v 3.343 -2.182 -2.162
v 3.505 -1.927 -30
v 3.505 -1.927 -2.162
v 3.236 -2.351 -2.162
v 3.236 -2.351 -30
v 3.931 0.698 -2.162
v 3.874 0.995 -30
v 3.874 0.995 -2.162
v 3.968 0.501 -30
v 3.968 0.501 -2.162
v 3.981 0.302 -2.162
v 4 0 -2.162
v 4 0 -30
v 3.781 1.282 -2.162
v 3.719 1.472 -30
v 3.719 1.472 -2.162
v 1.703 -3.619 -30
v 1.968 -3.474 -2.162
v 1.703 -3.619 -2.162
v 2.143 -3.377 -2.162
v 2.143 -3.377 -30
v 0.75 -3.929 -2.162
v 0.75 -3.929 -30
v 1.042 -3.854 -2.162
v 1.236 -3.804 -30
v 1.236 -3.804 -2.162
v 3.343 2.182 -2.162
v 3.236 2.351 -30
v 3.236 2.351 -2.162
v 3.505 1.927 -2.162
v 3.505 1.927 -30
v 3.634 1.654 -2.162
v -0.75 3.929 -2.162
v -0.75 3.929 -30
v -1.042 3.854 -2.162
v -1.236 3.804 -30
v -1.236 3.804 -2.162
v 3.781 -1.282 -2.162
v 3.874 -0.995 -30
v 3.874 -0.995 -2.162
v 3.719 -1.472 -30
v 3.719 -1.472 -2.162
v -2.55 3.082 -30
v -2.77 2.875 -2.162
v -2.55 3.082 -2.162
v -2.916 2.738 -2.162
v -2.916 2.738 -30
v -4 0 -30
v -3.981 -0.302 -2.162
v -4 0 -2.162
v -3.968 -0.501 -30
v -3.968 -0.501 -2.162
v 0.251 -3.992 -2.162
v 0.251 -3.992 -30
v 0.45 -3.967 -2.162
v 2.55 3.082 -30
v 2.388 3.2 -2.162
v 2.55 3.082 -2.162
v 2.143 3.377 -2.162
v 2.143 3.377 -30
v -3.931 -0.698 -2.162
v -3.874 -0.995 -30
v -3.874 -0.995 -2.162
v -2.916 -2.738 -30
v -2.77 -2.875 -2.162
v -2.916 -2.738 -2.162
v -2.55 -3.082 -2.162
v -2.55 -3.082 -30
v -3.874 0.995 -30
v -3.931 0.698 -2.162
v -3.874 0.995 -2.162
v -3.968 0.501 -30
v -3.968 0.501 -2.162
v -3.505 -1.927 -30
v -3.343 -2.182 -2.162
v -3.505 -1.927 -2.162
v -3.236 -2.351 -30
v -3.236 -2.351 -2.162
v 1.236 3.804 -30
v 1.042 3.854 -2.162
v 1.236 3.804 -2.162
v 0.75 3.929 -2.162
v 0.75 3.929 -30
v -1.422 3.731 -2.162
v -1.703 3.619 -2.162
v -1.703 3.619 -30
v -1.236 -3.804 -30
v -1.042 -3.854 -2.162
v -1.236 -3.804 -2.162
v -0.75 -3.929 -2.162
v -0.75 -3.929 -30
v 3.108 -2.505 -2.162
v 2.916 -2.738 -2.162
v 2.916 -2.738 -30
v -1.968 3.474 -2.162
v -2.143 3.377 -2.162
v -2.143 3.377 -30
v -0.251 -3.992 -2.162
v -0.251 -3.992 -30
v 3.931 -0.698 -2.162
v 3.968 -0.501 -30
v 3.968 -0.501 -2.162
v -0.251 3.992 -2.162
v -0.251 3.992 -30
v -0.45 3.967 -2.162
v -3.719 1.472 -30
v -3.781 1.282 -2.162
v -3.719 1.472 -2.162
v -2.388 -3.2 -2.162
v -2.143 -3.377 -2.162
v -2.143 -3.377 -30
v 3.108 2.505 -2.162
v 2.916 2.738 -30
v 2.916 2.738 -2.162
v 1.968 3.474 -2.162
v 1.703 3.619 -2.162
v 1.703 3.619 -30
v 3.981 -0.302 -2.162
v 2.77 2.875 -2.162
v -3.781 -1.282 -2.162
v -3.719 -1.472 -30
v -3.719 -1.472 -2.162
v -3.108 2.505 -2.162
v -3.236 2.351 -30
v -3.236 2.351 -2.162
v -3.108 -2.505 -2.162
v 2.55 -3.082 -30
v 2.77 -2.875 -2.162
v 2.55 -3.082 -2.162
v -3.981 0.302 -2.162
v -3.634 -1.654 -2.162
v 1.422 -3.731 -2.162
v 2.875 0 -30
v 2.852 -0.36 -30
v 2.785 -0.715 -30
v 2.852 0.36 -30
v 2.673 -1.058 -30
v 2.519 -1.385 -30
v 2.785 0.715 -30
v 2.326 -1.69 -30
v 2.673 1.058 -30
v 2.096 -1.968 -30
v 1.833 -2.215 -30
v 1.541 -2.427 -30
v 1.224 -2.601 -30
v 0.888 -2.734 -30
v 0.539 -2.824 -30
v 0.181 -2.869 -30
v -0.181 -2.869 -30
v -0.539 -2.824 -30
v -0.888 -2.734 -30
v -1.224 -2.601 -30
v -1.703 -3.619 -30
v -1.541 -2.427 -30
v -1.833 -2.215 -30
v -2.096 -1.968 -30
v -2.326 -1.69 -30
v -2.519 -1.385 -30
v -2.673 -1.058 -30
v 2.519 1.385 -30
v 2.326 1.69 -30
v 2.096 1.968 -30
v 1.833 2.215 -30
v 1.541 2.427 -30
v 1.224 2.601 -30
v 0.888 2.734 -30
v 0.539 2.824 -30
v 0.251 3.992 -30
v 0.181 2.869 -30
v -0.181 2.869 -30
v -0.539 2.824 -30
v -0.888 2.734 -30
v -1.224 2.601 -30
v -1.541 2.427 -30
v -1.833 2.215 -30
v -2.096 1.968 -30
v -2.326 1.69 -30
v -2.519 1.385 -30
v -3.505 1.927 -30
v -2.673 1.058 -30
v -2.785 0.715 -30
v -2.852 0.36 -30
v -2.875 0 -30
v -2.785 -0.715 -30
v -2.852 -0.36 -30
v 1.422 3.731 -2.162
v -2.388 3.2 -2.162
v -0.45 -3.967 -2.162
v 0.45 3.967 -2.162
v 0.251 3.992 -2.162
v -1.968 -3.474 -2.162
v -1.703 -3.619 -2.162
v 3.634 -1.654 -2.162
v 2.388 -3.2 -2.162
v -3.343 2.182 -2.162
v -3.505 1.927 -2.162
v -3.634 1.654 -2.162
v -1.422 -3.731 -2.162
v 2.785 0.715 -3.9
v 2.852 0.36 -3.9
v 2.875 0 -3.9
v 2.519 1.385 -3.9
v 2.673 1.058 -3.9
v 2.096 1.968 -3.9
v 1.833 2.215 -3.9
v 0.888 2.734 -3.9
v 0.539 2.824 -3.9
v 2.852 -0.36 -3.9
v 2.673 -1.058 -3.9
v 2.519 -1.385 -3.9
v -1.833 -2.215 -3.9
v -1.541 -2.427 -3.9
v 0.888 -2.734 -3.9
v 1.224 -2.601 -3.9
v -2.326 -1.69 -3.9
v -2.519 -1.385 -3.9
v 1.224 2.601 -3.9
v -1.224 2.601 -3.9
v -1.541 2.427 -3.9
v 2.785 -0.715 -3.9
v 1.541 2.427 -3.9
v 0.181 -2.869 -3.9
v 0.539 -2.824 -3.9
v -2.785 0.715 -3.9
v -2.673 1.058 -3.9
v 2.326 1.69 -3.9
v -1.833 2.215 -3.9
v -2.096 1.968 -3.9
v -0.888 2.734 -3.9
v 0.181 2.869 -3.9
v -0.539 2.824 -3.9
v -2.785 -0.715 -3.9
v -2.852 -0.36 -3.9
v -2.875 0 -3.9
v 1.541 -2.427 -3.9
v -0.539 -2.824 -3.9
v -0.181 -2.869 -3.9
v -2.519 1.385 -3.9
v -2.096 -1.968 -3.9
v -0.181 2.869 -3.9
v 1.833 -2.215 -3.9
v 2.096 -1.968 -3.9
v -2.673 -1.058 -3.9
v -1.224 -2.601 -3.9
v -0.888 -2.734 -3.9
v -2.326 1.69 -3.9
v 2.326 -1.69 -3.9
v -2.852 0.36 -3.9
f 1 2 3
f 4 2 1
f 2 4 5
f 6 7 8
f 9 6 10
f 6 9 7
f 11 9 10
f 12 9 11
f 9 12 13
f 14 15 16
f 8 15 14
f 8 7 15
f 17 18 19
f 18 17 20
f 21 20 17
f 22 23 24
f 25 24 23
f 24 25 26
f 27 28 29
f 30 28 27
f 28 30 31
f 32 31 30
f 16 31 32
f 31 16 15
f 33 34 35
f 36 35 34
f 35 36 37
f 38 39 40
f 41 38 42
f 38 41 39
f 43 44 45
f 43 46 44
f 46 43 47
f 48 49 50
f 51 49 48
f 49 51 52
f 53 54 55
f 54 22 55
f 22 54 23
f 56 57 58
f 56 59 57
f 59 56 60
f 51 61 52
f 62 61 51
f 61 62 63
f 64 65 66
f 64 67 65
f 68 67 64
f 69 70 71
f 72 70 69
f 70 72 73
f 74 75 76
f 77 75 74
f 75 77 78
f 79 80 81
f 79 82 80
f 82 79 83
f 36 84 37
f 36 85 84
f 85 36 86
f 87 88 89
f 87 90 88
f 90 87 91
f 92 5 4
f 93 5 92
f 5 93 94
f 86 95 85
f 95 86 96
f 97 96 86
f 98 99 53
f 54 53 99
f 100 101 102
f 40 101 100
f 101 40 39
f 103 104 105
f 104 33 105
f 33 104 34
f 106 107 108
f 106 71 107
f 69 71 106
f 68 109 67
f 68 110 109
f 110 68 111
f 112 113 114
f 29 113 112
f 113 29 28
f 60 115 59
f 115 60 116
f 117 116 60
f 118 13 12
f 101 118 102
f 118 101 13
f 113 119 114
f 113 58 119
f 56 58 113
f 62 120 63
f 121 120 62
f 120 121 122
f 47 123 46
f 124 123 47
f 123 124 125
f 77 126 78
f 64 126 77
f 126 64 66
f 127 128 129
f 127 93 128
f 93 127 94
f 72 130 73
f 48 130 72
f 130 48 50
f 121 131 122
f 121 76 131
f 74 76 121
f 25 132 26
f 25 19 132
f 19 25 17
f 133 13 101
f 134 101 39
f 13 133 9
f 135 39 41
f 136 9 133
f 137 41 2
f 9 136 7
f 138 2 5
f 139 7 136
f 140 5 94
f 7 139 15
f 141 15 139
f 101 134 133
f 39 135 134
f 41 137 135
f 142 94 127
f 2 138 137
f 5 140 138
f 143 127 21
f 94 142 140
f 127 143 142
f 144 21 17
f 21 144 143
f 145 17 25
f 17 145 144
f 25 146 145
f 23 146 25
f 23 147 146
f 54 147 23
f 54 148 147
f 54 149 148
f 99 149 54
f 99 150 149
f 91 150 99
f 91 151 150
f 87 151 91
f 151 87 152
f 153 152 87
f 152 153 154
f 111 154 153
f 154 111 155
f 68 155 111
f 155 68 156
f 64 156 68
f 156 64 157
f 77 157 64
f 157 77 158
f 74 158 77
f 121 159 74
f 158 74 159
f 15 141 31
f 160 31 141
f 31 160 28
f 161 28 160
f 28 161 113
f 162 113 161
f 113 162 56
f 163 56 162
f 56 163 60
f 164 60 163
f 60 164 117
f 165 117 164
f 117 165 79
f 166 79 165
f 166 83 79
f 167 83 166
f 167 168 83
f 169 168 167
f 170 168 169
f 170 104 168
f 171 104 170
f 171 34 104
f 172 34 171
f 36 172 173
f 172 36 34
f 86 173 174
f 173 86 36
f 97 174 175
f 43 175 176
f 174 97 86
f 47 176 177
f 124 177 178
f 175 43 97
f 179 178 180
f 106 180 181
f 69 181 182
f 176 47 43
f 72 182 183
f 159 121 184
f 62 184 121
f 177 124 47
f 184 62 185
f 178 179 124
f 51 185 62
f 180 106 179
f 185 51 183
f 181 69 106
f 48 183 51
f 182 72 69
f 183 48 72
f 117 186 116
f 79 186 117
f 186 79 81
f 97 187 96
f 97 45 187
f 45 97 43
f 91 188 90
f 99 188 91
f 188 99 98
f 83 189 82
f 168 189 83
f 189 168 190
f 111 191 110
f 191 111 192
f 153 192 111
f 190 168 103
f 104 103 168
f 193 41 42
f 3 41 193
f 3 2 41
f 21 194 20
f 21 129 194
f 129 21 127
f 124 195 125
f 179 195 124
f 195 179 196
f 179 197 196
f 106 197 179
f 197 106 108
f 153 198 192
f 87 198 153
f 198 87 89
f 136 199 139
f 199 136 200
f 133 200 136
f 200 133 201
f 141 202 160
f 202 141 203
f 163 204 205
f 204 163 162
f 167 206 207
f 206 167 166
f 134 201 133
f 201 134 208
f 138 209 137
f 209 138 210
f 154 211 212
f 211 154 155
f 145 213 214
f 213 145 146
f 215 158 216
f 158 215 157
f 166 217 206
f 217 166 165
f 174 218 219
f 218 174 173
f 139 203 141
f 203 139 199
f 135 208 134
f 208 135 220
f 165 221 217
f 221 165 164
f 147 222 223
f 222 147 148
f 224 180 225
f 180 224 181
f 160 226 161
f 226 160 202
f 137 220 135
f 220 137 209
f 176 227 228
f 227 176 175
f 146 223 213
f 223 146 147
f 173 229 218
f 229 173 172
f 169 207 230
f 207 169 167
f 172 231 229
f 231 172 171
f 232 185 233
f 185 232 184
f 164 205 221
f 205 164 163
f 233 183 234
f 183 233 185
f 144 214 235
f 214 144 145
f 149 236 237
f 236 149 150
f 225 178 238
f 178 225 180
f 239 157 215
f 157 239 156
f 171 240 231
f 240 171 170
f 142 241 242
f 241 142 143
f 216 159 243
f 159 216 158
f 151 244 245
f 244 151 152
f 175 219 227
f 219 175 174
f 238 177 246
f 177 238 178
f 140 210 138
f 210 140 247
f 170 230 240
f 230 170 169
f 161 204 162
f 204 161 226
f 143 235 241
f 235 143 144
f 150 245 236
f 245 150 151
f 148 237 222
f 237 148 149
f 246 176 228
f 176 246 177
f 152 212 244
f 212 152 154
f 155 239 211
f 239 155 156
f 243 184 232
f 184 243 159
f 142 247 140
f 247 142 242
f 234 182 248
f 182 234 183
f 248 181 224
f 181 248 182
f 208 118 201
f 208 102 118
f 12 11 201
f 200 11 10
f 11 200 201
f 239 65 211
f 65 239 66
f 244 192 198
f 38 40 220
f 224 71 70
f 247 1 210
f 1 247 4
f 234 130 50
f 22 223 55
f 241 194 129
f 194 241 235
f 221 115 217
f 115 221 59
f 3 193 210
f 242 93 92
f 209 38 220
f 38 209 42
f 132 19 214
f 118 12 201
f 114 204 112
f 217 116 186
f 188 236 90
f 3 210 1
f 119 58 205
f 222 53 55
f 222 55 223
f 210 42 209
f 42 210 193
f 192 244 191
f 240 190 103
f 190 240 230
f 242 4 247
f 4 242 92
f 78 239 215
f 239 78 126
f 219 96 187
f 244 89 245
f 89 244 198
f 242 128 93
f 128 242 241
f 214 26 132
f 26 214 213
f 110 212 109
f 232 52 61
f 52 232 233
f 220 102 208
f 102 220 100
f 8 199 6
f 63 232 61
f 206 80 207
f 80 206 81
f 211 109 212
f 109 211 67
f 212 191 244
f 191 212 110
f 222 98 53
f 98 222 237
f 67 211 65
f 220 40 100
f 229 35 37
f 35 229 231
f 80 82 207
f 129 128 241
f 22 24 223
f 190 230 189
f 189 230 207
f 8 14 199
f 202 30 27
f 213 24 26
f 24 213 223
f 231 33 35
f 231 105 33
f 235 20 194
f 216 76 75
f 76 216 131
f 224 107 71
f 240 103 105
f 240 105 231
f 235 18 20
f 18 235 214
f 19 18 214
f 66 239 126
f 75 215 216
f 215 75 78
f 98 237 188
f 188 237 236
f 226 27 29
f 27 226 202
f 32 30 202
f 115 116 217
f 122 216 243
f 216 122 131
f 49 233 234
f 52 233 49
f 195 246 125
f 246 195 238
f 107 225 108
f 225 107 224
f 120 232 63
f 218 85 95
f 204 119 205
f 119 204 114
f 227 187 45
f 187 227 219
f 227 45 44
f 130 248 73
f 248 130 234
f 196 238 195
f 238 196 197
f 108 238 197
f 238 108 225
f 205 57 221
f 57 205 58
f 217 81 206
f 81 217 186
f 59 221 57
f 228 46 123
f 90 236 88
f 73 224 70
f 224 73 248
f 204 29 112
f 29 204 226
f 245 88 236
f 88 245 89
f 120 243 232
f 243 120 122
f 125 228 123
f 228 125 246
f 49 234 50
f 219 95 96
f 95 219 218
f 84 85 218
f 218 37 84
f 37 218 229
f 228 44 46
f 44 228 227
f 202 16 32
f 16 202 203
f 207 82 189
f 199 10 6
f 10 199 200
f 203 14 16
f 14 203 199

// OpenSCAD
$fn = 50;

difference() {
	union() {
		translate(v = [0, 0, -30.0]) {
			cylinder(h = 33, r = 4.0);
		}
		#translate(v = [0, 0, -33.0]) {
			cylinder(h = 33, r = 2.875);
		}
	}
	union() {
		translate(v = [0, 0, 0]) {
			rotate(a = [0, 0, 0]) {
				difference() {
					union() {
						translate(v = [0, 0, -33.0]) {
							cylinder(h = 33, r = 2.6);
						}
						translate(v = [0, 0, -3.9]) {
							cylinder(h = 3.9, r1 = 2.875, r2 = 5.4);
						}
						translate(v = [0, 0, -33.0]) {
							cylinder(h = 33, r = 2.875);
						}
						translate(v = [0, 0, -33.0]) {
							cylinder(h = 33, r = 2.6);
						}
					}
					union();
				}
			}
		}
		#cylinder(h = 3, r = 5.0);
	}
}
